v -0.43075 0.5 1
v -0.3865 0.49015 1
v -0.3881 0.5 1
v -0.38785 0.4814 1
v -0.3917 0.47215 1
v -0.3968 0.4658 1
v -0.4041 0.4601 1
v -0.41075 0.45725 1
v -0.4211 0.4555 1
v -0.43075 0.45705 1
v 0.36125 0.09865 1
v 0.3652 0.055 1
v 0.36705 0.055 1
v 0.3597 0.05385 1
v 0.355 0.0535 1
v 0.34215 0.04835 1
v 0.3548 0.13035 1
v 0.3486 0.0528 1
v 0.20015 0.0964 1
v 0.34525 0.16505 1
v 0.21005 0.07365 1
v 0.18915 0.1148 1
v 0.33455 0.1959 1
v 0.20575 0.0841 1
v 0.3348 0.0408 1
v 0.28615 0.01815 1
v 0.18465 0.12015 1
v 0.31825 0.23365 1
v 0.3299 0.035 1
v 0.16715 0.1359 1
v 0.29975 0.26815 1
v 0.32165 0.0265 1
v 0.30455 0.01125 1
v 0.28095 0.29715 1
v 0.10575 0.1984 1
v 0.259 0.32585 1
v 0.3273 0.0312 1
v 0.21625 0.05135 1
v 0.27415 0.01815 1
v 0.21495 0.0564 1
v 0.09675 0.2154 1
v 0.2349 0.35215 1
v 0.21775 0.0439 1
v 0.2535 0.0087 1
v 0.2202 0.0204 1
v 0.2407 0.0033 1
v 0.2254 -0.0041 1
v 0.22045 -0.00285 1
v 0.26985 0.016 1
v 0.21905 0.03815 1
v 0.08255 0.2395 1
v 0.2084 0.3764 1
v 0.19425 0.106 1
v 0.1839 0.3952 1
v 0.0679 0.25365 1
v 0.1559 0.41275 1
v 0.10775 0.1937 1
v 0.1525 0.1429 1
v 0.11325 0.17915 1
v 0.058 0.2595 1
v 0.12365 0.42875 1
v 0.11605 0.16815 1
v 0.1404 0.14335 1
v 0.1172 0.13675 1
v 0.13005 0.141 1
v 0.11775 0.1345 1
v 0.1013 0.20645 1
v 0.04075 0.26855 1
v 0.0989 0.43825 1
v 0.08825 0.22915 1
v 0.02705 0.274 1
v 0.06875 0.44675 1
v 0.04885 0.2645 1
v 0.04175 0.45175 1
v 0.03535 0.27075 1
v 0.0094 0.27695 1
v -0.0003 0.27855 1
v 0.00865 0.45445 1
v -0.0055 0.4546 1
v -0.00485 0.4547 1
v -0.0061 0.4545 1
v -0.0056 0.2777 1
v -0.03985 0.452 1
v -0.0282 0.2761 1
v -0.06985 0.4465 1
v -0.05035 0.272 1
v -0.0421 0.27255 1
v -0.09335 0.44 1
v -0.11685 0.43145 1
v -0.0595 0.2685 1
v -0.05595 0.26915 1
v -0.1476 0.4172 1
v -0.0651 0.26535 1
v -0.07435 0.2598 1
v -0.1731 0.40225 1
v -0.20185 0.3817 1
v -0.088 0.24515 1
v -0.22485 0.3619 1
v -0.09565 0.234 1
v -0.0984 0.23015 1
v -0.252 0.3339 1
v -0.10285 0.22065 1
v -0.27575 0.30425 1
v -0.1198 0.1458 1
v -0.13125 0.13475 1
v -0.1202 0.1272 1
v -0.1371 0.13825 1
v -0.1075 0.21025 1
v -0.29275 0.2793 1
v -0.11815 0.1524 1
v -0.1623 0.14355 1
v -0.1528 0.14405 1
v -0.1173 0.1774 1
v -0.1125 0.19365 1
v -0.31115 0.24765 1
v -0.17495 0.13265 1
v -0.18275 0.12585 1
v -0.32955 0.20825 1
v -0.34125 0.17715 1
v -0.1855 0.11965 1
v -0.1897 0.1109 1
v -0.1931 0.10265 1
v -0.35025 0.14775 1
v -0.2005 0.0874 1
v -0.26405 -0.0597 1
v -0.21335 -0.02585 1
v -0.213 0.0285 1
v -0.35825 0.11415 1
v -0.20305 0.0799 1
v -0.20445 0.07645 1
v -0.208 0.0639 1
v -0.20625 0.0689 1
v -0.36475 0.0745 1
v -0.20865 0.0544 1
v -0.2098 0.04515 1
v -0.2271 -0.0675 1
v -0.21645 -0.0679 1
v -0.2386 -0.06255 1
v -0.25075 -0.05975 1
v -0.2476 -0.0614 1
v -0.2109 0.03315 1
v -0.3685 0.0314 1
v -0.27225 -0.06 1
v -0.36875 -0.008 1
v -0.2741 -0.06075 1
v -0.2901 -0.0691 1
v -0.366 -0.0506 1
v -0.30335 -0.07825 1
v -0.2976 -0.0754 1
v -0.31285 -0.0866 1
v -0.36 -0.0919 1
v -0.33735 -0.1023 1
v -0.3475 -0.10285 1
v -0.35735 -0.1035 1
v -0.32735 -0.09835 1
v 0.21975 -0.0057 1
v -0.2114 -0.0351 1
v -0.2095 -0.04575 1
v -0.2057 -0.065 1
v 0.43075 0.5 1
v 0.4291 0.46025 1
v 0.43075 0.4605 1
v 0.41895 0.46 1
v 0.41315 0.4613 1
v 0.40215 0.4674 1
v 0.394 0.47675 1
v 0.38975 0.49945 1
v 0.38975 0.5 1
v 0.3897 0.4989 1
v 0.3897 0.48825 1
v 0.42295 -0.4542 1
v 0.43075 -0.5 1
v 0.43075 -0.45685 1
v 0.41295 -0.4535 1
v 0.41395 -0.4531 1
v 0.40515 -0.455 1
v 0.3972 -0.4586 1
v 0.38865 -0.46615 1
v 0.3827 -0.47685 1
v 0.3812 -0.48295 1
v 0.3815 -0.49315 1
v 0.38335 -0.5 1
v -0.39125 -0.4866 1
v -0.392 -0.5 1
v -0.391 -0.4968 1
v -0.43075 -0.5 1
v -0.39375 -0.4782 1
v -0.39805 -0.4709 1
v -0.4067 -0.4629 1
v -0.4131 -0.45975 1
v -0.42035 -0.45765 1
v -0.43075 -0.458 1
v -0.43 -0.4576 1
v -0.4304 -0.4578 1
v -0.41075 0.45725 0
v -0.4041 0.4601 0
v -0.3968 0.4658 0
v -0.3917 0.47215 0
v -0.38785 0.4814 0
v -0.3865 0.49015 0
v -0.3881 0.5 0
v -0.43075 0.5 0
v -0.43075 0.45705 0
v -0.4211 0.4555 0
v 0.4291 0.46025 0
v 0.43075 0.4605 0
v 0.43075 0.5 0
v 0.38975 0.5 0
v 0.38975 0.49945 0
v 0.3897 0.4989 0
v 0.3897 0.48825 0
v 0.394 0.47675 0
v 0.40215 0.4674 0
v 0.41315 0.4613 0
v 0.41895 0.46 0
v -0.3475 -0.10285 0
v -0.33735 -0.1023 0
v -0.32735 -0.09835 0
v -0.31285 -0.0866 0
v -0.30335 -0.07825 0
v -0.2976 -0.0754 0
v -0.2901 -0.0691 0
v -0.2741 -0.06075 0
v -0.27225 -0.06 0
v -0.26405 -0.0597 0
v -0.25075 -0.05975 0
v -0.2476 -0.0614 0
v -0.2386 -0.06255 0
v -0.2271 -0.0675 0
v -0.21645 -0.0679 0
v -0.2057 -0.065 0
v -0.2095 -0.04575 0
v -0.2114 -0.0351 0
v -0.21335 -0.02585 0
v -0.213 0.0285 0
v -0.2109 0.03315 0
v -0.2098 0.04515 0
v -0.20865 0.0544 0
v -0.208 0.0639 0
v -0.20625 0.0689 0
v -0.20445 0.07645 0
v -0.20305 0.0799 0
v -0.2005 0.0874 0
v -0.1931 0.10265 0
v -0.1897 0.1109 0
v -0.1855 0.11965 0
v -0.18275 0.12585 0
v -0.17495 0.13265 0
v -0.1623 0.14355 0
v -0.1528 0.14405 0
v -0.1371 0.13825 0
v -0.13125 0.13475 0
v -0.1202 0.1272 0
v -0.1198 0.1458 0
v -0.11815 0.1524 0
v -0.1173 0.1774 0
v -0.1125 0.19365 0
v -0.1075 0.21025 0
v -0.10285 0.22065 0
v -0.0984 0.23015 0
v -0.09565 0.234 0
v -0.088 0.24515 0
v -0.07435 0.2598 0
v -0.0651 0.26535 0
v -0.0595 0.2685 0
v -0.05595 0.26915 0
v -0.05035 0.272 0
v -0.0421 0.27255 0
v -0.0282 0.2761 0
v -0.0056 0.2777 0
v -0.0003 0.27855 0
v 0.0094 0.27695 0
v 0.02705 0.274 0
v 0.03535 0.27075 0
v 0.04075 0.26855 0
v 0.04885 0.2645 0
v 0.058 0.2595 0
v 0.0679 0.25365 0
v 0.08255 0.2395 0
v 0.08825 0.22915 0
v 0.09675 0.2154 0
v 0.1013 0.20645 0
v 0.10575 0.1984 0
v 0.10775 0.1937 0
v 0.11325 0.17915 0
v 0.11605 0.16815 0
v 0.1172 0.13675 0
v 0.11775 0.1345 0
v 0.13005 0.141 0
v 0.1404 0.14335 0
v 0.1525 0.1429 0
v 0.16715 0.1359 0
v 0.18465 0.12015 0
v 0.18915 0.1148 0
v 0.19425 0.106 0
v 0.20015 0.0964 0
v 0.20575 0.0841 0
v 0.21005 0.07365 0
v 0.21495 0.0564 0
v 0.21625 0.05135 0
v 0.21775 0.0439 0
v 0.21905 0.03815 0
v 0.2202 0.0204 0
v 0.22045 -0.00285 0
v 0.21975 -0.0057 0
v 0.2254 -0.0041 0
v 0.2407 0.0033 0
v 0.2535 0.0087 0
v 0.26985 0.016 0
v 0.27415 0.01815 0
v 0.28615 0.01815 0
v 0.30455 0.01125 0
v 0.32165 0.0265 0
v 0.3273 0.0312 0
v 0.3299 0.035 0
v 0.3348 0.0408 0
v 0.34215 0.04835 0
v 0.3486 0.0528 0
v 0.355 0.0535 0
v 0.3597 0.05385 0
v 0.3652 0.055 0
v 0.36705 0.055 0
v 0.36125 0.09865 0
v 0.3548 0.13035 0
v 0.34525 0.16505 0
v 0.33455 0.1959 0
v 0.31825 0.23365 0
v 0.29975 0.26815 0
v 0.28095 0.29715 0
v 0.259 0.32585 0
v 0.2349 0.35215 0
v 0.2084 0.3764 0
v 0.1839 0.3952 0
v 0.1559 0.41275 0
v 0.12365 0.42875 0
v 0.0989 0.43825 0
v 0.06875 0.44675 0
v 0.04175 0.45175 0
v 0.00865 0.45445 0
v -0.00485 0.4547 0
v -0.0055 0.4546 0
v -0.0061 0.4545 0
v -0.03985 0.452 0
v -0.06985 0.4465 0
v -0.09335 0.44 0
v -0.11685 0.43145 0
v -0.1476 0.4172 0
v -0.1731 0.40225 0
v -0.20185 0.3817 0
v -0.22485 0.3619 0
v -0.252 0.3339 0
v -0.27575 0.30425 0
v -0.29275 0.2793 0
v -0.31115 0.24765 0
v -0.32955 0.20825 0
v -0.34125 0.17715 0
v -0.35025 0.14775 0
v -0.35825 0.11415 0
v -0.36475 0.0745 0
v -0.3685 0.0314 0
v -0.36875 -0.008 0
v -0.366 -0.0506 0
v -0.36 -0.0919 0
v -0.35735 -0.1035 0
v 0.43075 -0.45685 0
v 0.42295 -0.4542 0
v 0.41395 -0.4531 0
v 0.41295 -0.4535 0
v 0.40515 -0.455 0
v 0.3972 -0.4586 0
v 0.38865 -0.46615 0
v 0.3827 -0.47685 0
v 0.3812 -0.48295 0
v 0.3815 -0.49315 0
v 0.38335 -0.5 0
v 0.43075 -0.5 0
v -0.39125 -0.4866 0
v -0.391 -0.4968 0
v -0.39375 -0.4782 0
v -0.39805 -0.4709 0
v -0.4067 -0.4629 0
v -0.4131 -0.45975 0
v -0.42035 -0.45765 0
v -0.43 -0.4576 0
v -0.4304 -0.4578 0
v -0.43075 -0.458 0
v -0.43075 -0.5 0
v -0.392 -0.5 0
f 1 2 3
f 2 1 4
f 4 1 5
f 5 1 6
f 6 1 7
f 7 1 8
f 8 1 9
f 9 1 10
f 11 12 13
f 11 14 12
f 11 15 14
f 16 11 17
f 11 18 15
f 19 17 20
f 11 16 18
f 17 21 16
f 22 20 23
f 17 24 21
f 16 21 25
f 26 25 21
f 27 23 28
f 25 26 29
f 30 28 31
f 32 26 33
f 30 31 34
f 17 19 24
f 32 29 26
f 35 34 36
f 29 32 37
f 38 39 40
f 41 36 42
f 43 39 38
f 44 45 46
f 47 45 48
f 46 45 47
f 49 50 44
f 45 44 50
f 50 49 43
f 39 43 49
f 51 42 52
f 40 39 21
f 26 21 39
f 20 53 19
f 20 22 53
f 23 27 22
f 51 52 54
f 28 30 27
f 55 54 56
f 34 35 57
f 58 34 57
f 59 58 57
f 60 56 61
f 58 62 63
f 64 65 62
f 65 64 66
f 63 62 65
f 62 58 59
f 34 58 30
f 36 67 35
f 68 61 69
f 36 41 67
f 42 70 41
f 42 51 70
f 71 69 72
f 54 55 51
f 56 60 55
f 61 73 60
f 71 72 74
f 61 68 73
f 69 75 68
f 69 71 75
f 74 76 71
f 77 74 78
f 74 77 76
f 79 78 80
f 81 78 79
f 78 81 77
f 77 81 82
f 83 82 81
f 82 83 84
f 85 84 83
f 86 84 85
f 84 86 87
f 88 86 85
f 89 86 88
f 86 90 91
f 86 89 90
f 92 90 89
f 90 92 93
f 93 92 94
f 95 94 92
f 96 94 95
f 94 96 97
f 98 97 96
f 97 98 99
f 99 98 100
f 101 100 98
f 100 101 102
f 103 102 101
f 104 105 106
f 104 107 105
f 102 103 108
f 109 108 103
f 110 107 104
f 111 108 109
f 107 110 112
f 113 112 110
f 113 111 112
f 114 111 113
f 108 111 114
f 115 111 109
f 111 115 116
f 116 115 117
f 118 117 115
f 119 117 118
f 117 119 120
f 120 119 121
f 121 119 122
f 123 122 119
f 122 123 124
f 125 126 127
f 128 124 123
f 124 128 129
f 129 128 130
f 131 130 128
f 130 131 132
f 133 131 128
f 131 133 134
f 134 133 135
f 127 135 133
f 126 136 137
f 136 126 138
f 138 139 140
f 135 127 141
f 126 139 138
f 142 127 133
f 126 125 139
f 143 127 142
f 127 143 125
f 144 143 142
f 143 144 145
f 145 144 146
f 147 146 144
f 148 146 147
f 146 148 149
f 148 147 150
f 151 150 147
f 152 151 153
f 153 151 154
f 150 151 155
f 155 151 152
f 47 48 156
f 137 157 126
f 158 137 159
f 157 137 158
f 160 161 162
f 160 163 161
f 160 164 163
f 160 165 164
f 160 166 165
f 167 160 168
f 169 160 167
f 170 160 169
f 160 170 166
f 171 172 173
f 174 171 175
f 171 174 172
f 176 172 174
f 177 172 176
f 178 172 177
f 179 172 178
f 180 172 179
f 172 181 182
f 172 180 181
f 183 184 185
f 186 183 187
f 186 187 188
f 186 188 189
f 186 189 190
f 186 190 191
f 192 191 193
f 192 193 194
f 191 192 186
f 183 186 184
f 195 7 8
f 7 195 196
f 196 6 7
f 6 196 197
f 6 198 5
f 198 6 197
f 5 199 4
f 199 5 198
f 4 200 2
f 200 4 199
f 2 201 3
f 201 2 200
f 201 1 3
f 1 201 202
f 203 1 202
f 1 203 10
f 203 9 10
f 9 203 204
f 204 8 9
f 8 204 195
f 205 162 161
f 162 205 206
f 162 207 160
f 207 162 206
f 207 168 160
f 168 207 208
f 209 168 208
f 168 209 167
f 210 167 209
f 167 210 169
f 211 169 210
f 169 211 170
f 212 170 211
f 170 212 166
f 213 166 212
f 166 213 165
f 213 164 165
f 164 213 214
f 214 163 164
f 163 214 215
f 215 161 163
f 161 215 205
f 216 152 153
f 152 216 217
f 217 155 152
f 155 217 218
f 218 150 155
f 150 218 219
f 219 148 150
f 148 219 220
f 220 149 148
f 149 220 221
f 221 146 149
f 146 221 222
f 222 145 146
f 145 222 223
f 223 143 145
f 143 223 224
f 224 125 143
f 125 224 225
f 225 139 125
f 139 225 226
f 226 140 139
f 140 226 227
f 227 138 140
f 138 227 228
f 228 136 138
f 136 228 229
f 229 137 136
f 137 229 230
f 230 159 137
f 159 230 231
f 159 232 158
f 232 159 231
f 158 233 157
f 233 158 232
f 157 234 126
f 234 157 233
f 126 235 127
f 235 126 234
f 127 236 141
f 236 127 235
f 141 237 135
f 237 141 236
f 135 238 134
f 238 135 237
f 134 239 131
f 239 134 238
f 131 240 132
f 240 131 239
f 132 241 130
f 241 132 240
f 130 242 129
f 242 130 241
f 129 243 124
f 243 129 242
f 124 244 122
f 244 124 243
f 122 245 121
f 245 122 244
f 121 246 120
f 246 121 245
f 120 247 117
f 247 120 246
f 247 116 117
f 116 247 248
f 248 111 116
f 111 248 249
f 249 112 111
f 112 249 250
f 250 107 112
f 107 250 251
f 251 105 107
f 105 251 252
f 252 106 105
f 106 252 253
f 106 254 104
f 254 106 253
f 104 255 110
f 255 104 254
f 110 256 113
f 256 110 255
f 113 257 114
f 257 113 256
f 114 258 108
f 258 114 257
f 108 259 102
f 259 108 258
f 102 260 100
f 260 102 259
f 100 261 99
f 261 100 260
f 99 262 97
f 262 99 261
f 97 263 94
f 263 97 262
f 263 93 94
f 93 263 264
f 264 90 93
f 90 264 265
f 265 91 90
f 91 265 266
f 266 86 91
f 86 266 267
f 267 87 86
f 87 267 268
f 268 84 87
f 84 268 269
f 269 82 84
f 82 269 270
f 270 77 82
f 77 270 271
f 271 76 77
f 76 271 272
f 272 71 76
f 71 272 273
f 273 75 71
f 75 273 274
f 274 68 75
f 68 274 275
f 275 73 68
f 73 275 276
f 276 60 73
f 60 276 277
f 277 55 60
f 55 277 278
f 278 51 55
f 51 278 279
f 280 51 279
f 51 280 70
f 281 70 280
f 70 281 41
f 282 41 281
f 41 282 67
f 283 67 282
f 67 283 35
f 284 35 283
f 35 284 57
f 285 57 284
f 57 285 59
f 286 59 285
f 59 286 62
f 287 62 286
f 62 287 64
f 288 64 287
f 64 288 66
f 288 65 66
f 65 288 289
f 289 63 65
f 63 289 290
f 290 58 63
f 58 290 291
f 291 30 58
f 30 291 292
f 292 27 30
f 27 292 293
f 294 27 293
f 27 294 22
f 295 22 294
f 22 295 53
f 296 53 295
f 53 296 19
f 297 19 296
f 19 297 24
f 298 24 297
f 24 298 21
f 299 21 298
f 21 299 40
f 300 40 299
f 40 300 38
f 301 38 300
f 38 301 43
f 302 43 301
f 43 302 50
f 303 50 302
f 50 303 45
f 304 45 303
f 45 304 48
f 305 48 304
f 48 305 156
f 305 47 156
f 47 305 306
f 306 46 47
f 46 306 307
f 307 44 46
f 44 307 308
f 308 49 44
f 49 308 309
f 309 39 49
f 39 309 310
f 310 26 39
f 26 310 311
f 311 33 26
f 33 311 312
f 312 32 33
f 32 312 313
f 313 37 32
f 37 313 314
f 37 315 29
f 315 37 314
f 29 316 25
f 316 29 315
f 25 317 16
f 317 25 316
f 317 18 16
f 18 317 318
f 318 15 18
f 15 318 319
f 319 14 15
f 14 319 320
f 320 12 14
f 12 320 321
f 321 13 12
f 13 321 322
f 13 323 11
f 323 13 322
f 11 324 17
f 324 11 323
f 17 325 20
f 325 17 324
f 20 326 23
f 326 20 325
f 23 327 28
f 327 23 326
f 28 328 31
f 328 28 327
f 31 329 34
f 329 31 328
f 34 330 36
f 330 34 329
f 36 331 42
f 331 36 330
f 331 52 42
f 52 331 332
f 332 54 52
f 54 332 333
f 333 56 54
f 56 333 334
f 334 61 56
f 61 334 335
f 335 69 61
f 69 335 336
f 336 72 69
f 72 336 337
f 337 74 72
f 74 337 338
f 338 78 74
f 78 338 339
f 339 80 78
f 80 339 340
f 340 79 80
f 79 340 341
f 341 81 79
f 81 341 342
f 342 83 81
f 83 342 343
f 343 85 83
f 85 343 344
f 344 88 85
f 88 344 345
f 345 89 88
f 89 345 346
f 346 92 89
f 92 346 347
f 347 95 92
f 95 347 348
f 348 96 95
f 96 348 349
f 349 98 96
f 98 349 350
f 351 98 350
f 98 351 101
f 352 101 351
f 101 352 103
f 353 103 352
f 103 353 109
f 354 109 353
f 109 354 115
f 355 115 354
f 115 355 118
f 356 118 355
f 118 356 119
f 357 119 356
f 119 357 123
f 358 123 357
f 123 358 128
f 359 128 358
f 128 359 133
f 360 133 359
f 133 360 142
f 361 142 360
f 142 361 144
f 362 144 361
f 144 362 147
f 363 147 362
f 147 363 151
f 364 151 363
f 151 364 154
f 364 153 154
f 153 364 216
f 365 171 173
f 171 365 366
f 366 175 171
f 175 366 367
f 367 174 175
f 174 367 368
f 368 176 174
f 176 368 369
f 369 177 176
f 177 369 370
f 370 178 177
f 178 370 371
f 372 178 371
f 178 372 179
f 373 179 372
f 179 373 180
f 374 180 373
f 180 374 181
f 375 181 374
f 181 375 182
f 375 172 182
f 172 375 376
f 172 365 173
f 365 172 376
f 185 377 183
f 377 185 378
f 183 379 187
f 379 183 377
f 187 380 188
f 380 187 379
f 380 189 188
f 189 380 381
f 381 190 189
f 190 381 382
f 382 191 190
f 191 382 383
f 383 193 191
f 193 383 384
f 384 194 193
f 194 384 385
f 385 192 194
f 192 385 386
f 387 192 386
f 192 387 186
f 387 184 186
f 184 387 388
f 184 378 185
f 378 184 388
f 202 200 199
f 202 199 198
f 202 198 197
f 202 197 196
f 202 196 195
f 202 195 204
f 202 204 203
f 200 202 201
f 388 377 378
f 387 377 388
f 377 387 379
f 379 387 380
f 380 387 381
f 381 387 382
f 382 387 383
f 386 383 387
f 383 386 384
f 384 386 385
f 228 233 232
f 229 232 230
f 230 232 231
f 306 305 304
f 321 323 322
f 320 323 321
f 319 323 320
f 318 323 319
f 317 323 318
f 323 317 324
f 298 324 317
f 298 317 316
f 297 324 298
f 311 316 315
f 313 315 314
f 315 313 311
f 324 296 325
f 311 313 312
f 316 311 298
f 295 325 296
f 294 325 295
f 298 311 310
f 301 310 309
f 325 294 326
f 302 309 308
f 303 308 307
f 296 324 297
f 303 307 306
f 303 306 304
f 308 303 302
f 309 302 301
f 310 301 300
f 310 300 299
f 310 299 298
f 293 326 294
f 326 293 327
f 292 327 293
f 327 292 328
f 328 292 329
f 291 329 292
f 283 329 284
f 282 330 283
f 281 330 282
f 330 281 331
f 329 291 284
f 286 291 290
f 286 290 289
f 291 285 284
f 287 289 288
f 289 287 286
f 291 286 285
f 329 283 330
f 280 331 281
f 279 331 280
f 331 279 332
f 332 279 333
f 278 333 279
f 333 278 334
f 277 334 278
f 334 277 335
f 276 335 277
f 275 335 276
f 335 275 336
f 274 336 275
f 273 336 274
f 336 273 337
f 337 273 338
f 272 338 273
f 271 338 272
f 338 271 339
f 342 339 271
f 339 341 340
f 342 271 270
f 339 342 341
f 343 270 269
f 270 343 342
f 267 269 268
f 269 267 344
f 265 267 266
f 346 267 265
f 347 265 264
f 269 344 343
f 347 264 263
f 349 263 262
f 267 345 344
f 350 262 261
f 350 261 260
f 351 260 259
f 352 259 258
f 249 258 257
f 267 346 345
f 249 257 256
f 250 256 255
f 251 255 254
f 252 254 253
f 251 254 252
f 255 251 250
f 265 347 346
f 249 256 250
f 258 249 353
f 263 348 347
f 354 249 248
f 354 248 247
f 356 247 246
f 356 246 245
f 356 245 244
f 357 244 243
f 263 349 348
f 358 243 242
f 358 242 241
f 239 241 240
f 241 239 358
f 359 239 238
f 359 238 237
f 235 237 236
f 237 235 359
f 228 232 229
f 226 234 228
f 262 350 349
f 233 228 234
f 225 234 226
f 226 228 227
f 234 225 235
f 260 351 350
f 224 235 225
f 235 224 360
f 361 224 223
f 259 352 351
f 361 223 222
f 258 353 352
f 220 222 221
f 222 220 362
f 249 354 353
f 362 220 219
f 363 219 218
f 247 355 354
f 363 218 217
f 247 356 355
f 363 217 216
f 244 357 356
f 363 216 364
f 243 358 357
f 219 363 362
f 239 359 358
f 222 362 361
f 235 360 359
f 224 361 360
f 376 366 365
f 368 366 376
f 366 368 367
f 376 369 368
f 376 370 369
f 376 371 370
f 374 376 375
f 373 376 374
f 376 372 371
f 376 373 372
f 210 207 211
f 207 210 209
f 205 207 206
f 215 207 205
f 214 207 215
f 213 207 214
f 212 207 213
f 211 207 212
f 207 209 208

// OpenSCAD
module Hedwig2blue2_1()
{
 /* Generated by trace2scad version 20150415
    http://aggregate.org/MAKE/TRACE2SCAD/
    Optimized model has 196/2331 original points
 */
 color([0.5, 0.5, 0.5])
 assign(minx=0) /* polygon minx=0 */
 assign(miny=0) /* polygon miny=0 */
 assign(maxx=17230) /* polygon maxx=17230 */
 assign(maxy=20000) /* polygon maxy=20000 */
 assign(dx=maxx-minx)
 assign(dy=maxy-miny)
 assign(maxd=((dx>dy)?dx:dy))
 scale([1/maxd, 1/maxd, 1])
 translate([-minx-dx/2, -miny-dy/2, 0])
 linear_extrude(height=1, convexity=196)
 union() {
  union() {
   polygon([[0,19571],[0,19141],[193,19110],[400,19145],[533,19202],[679,19316],[781,19443],[858,19628],[885,19803],[853,20000],[0,20000]], convexity=5);
   polygon([[16410,19989],[16409,19978],[16409,19765],[16495,19535],[16658,19348],[16878,19226],[16994,19200],[17197,19205],[17230,19210],[17230,20000],[16410,20000]], convexity=6);
   polygon([[8505,19092],[8493,19090],[7818,19040],[7218,18930],[6748,18800],[6278,18629],[5663,18344],[5153,18045],[4578,17634],[4118,17238],[3575,16678],[3100,16085],[2760,15586],[2392,14953],[2024,14165],[1790,13543],[1610,12955],[1450,12283],[1320,11490],[1245,10628],[1240,9840],[1295,8988],[1415,8162],[1468,7930],[1665,7943],[1868,7954],[2068,8033],[2358,8268],[2548,8435],[2663,8492],[2813,8618],[3133,8785],[3170,8800],[3334,8806],[3600,8805],[3663,8772],[3843,8749],[4073,8650],[4286,8642],[4501,8700],[4425,9085],[4387,9298],[4348,9483],[4355,10570],[4397,10663],[4419,10903],[4442,11088],[4455,11278],[4490,11378],[4526,11529],[4554,11598],[4605,11748],[4753,12053],[4821,12218],[4905,12393],[4960,12517],[5116,12653],[5369,12871],[5559,12881],[5873,12765],[5990,12695],[6211,12544],[6219,12916],[6252,13048],[6269,13548],[6365,13873],[6465,14205],[6558,14413],[6647,14603],[6702,14680],[6855,14903],[7128,15196],[7313,15307],[7425,15370],[7496,15383],[7608,15440],[7773,15451],[8051,15522],[8503,15554],[8609,15571],[8803,15539],[9156,15480],[9322,15415],[9430,15371],[9592,15290],[9775,15190],[9973,15073],[10266,14790],[10380,14583],[10550,14308],[10641,14129],[10730,13968],[10770,13874],[10880,13583],[10936,13363],[10959,12735],[10970,12690],[11216,12820],[11423,12867],[11665,12858],[11958,12718],[12308,12403],[12398,12296],[12500,12120],[12618,11928],[12730,11682],[12816,11473],[12914,11128],[12940,11027],[12970,10878],[12996,10763],[13019,10408],[13024,9943],[13010,9886],[13123,9918],[13429,10066],[13685,10174],[14012,10320],[14098,10363],[14338,10363],[14706,10225],[15048,10530],[15161,10624],[15213,10700],[15311,10816],[15458,10967],[15587,11056],[15715,11070],[15809,11077],[15919,11100],[15956,11100],[15840,11973],[15711,12607],[15520,13301],[15306,13918],[14980,14673],[14610,15363],[14234,15943],[13795,16517],[13313,17043],[12783,17528],[12293,17904],[11733,18255],[11088,18575],[10593,18765],[9990,18935],[9450,19035],[8788,19089],[8518,19094]], convexity=19);
   polygon([[16884,934],[16874,930],[16718,900],[16559,828],[16388,677],[16269,463],[16239,341],[16245,137],[16282,0],[17230,0],[17230,863],[17074,916],[16894,938]], convexity=6);
   polygon([[7,844],[0,840],[0,0],[775,0],[795,64],[790,268],[740,436],[654,582],[481,742],[353,805],[208,847],[15,848]], convexity=6);
  }
 }
}

module Hedwig2blue2()
{
 /* all layers combined, scaled to within a 1mm cube */
 scale([1, 1, 1/1])
 difference() {
  union() {
   scale([1,1,2]) translate([0,0,-0.5]) Hedwig2blue2_1();
  }
  translate([0,0,-2]) cube([2,2,4],center=true);
 }
}
Hedwig2blue2();
